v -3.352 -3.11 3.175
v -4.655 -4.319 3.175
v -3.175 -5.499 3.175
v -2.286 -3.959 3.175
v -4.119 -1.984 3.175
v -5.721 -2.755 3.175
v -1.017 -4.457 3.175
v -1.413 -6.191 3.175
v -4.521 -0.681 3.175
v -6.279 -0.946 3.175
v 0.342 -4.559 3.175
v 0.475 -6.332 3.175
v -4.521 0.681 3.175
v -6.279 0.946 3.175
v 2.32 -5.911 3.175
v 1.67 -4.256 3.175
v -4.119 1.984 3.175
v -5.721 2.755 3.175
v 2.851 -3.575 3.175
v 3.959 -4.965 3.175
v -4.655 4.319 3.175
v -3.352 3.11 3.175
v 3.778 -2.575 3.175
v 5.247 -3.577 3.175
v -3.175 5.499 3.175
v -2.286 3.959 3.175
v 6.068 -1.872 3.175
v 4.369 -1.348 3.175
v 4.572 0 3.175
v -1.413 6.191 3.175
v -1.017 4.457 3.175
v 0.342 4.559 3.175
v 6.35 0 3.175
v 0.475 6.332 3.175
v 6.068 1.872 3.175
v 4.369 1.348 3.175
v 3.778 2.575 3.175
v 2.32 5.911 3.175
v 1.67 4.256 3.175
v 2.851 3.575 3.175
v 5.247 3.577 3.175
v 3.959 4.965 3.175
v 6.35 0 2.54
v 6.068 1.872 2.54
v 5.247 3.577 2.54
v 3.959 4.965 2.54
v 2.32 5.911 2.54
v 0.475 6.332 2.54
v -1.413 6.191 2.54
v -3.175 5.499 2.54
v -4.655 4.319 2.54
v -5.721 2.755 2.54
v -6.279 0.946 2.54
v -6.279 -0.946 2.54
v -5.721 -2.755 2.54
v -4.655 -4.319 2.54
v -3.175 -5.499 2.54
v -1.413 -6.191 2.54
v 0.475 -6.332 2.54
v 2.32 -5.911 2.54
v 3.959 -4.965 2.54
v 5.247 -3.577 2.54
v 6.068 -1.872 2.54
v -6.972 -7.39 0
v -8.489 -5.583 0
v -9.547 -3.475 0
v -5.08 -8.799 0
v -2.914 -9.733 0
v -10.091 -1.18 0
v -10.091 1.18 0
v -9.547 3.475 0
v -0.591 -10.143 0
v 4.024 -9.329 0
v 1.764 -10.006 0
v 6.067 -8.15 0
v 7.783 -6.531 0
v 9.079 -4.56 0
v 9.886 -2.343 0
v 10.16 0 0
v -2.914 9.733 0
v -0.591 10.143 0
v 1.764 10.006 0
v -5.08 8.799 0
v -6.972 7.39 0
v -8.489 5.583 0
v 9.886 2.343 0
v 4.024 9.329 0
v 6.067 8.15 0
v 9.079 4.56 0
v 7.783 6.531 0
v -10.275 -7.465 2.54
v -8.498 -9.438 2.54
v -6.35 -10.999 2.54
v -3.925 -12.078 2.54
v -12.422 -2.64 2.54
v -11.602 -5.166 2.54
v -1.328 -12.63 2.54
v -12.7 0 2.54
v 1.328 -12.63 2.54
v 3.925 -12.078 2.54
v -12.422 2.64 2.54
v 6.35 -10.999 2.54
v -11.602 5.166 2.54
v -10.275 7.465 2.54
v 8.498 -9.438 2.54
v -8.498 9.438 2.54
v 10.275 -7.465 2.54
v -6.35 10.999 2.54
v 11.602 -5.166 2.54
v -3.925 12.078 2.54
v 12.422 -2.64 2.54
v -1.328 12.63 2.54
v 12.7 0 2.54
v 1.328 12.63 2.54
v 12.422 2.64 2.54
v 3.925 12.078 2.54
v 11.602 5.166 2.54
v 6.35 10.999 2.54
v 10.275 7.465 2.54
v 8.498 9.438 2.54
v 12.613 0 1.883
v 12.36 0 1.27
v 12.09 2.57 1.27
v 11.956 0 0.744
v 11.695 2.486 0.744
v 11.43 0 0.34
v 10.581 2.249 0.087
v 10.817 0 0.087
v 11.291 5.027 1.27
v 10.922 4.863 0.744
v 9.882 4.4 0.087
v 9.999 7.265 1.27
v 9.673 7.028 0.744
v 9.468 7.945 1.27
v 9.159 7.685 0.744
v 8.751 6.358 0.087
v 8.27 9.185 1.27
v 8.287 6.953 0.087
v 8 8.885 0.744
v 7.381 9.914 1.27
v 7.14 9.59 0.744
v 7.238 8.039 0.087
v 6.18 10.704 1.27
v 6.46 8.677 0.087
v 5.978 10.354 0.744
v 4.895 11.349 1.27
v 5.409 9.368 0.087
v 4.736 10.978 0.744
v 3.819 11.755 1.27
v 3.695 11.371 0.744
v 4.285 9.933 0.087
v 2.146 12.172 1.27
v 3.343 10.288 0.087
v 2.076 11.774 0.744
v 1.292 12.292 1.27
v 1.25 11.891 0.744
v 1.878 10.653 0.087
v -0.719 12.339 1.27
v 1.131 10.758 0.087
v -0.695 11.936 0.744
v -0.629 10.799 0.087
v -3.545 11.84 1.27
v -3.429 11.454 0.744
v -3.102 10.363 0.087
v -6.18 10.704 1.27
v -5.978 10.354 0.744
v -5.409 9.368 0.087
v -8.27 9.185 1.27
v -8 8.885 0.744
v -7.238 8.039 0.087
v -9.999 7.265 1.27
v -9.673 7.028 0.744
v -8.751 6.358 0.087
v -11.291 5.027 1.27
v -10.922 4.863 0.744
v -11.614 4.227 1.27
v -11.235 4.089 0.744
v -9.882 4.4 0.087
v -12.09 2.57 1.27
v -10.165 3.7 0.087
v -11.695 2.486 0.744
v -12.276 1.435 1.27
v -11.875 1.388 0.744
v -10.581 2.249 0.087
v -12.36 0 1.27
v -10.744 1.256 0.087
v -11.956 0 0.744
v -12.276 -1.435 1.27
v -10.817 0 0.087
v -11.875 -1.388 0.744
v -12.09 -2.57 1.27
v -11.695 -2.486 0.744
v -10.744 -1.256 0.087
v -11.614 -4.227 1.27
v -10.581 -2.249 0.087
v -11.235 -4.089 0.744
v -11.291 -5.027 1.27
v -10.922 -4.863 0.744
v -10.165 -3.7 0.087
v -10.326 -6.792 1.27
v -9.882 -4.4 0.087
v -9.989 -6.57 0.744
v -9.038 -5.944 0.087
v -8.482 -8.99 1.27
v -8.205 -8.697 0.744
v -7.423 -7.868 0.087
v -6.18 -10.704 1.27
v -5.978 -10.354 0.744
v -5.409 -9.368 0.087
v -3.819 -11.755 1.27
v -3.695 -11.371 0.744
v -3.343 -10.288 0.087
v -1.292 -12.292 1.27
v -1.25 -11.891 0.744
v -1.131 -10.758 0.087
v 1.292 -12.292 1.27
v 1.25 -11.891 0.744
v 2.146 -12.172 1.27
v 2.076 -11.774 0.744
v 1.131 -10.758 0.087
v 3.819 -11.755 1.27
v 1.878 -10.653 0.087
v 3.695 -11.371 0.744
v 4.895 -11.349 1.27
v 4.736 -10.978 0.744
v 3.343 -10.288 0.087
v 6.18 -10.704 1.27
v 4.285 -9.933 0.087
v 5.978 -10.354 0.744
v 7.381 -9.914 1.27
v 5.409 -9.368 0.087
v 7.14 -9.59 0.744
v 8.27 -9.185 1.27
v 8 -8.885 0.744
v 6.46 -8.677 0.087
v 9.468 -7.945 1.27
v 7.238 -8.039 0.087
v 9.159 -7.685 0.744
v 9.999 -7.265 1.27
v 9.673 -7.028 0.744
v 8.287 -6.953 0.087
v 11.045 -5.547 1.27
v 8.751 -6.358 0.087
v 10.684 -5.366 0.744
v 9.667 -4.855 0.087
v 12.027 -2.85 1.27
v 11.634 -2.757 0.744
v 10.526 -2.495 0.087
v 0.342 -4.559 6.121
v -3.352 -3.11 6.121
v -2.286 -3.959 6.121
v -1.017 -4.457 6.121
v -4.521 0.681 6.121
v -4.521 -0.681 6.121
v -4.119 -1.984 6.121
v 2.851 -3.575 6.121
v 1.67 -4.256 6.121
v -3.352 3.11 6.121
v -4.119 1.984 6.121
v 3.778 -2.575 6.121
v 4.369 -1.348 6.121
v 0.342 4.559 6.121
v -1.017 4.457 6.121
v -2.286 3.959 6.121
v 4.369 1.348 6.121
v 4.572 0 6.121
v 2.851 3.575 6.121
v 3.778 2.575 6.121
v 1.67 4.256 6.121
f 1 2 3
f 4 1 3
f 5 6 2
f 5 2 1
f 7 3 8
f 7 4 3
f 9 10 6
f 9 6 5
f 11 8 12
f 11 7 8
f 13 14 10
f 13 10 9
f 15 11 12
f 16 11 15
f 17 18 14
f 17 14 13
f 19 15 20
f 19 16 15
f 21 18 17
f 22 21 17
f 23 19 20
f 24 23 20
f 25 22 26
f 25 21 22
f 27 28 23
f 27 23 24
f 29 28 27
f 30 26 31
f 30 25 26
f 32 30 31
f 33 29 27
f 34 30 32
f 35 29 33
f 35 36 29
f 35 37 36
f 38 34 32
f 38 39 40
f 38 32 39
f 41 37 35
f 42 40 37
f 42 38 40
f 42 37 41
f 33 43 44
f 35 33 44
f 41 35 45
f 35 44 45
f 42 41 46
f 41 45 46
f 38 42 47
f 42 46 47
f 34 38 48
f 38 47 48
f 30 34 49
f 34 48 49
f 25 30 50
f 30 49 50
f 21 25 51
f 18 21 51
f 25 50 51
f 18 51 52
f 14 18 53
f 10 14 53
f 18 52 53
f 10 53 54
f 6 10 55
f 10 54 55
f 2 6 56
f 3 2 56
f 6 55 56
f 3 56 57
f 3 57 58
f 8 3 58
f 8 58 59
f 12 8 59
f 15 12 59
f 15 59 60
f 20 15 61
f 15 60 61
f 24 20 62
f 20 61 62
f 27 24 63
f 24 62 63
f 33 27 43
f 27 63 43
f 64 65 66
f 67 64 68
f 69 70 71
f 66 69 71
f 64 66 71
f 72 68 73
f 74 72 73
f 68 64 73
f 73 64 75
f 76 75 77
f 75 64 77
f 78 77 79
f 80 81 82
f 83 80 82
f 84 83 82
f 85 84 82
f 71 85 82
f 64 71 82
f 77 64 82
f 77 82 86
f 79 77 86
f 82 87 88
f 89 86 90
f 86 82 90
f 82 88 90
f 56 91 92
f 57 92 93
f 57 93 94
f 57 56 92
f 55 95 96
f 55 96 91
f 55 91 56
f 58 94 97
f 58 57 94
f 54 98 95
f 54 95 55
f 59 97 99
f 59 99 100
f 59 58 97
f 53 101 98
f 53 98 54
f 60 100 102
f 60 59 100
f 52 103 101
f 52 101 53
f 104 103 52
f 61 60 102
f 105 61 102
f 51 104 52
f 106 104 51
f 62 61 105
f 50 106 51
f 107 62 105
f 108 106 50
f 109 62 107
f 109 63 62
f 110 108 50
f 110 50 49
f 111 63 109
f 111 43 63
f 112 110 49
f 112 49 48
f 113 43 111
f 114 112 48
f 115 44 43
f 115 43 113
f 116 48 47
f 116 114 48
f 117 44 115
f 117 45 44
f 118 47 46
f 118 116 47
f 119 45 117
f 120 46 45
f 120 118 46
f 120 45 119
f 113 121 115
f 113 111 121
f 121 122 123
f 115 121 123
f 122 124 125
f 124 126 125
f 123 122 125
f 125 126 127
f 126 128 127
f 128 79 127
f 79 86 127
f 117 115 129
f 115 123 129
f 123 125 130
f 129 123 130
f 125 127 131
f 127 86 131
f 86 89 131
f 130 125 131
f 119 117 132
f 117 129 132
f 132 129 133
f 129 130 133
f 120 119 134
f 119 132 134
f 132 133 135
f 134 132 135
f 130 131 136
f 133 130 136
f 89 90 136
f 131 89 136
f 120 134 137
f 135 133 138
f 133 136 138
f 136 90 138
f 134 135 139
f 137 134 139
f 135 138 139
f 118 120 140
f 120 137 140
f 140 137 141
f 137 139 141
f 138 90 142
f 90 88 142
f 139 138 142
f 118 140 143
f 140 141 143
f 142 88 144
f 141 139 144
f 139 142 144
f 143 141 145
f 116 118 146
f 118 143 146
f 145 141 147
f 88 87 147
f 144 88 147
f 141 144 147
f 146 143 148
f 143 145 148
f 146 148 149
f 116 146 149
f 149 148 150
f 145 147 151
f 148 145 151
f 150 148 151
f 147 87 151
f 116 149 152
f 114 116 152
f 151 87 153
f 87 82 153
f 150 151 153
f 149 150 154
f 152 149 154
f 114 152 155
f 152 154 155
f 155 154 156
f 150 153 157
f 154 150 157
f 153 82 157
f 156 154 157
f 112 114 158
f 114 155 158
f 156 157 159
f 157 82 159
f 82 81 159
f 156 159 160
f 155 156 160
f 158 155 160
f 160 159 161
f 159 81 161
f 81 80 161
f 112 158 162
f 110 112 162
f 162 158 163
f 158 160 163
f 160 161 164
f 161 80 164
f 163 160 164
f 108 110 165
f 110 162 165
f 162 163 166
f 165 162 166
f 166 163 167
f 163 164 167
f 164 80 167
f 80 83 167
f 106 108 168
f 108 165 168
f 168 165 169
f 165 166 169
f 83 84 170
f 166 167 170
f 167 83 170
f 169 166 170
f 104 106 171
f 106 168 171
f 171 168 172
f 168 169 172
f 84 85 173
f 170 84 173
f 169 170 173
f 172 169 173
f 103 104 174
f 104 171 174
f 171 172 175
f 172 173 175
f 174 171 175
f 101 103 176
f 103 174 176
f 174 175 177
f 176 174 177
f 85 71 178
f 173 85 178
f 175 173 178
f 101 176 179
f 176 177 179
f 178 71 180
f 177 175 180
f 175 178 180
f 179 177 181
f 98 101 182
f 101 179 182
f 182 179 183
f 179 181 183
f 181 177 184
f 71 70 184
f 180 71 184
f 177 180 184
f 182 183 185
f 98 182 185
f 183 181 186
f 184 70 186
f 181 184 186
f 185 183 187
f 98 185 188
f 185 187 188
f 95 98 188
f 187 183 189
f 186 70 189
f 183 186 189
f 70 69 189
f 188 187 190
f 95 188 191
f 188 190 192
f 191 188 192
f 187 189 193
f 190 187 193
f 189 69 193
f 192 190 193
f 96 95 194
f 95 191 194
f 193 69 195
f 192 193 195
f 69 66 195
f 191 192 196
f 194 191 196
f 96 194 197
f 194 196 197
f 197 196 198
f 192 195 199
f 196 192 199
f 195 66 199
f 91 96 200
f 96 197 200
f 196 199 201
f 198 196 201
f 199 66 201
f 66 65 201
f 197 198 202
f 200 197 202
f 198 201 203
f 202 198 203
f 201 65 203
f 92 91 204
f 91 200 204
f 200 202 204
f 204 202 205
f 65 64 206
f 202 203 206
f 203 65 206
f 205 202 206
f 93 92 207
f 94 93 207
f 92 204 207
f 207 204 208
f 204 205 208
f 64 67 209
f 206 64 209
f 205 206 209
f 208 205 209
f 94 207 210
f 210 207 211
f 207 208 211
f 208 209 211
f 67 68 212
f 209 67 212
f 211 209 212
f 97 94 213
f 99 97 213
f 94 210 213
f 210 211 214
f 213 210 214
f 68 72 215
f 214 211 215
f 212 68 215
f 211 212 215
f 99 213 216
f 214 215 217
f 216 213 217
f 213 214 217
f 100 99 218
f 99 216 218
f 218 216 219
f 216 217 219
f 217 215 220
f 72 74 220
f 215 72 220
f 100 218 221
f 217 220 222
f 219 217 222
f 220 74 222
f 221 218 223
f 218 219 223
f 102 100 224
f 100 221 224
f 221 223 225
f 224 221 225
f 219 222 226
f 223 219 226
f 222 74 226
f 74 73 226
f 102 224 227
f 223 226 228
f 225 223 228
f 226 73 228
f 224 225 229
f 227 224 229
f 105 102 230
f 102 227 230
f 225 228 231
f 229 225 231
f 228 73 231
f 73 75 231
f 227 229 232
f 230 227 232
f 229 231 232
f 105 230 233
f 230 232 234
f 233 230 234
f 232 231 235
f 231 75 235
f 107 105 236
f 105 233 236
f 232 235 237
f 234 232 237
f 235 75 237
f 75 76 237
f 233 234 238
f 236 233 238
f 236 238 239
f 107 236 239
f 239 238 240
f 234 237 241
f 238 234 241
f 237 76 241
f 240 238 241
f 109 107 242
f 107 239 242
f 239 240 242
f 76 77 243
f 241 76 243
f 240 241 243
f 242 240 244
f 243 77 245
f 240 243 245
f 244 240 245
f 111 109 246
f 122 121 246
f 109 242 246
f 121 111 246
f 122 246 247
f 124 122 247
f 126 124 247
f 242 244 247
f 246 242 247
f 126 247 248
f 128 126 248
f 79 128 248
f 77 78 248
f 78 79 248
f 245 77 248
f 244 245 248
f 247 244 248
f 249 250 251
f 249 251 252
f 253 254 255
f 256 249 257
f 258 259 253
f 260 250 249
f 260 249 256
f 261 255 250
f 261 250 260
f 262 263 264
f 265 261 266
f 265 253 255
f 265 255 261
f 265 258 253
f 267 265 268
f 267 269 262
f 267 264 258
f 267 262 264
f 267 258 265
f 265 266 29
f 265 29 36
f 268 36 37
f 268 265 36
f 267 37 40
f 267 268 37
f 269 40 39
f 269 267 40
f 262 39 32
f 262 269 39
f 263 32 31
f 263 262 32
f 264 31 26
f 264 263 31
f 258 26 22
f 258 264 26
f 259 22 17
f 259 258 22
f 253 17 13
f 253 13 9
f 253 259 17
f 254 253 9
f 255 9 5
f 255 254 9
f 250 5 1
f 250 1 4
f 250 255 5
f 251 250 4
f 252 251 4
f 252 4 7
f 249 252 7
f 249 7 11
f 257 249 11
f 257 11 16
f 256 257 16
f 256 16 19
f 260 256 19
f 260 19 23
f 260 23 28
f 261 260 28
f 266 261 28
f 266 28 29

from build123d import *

# Parameters (mm, degrees)
F0_R      = 12.7
F1_DEPTH  = 2.54
F2_R      = 2.53999
F3_R      = 6.35
F4_DEPTH  = 0.635
F5_R      = 4.7625
F6_DEPTH  = 4.7244
F7_R      = 4.7625
F7_R_2    = 4.572
F8_DEPTH  = 4.7244
F9_R      = 4.572
F10_DEPTH = 1.778


# Not quite as in the source:
# - a fillet or chamfer is up to 0.001 mm smaller than in the source, because OpenCascade refuses the exact size


with BuildPart() as f1:
    # F0 (on Top) → F1 (new body)
    with BuildSketch(Plane.XY):
        Circle(F0_R)
    extrude(amount=F1_DEPTH)

    # F2 (radius 2.54 in the source; OpenCascade refuses exactly that, so slightly less here)
    f2_edges = [f1.edges().sort_by_distance(p)[0] for p in [
        (-12.7, 0, 0),
    ]]
    fillet(f2_edges, radius=F2_R)

    # F3 (on face) → F4 (join)
    with BuildSketch(Plane.XY.offset(2.54)):
        Circle(F3_R)
    extrude(amount=F4_DEPTH)

    # F5 (on face) → F6 (join)
    with BuildSketch(Plane.XY.offset(3.175)):
        Circle(F5_R)
    extrude(amount=F6_DEPTH)

    # F7 (on face) → F8 (cut, through all)
    with BuildSketch(Plane.XY.offset(7.8994)):
        Circle(F7_R)
        Circle(F7_R_2, mode=Mode.SUBTRACT)
    extrude(amount=-F8_DEPTH, mode=Mode.SUBTRACT)

    # F9 (on face) → F10 (cut)
    with BuildSketch(Plane.XY.offset(7.8994)):
        Circle(F9_R)
    extrude(amount=-F10_DEPTH, mode=Mode.SUBTRACT)


solid = f1.part
